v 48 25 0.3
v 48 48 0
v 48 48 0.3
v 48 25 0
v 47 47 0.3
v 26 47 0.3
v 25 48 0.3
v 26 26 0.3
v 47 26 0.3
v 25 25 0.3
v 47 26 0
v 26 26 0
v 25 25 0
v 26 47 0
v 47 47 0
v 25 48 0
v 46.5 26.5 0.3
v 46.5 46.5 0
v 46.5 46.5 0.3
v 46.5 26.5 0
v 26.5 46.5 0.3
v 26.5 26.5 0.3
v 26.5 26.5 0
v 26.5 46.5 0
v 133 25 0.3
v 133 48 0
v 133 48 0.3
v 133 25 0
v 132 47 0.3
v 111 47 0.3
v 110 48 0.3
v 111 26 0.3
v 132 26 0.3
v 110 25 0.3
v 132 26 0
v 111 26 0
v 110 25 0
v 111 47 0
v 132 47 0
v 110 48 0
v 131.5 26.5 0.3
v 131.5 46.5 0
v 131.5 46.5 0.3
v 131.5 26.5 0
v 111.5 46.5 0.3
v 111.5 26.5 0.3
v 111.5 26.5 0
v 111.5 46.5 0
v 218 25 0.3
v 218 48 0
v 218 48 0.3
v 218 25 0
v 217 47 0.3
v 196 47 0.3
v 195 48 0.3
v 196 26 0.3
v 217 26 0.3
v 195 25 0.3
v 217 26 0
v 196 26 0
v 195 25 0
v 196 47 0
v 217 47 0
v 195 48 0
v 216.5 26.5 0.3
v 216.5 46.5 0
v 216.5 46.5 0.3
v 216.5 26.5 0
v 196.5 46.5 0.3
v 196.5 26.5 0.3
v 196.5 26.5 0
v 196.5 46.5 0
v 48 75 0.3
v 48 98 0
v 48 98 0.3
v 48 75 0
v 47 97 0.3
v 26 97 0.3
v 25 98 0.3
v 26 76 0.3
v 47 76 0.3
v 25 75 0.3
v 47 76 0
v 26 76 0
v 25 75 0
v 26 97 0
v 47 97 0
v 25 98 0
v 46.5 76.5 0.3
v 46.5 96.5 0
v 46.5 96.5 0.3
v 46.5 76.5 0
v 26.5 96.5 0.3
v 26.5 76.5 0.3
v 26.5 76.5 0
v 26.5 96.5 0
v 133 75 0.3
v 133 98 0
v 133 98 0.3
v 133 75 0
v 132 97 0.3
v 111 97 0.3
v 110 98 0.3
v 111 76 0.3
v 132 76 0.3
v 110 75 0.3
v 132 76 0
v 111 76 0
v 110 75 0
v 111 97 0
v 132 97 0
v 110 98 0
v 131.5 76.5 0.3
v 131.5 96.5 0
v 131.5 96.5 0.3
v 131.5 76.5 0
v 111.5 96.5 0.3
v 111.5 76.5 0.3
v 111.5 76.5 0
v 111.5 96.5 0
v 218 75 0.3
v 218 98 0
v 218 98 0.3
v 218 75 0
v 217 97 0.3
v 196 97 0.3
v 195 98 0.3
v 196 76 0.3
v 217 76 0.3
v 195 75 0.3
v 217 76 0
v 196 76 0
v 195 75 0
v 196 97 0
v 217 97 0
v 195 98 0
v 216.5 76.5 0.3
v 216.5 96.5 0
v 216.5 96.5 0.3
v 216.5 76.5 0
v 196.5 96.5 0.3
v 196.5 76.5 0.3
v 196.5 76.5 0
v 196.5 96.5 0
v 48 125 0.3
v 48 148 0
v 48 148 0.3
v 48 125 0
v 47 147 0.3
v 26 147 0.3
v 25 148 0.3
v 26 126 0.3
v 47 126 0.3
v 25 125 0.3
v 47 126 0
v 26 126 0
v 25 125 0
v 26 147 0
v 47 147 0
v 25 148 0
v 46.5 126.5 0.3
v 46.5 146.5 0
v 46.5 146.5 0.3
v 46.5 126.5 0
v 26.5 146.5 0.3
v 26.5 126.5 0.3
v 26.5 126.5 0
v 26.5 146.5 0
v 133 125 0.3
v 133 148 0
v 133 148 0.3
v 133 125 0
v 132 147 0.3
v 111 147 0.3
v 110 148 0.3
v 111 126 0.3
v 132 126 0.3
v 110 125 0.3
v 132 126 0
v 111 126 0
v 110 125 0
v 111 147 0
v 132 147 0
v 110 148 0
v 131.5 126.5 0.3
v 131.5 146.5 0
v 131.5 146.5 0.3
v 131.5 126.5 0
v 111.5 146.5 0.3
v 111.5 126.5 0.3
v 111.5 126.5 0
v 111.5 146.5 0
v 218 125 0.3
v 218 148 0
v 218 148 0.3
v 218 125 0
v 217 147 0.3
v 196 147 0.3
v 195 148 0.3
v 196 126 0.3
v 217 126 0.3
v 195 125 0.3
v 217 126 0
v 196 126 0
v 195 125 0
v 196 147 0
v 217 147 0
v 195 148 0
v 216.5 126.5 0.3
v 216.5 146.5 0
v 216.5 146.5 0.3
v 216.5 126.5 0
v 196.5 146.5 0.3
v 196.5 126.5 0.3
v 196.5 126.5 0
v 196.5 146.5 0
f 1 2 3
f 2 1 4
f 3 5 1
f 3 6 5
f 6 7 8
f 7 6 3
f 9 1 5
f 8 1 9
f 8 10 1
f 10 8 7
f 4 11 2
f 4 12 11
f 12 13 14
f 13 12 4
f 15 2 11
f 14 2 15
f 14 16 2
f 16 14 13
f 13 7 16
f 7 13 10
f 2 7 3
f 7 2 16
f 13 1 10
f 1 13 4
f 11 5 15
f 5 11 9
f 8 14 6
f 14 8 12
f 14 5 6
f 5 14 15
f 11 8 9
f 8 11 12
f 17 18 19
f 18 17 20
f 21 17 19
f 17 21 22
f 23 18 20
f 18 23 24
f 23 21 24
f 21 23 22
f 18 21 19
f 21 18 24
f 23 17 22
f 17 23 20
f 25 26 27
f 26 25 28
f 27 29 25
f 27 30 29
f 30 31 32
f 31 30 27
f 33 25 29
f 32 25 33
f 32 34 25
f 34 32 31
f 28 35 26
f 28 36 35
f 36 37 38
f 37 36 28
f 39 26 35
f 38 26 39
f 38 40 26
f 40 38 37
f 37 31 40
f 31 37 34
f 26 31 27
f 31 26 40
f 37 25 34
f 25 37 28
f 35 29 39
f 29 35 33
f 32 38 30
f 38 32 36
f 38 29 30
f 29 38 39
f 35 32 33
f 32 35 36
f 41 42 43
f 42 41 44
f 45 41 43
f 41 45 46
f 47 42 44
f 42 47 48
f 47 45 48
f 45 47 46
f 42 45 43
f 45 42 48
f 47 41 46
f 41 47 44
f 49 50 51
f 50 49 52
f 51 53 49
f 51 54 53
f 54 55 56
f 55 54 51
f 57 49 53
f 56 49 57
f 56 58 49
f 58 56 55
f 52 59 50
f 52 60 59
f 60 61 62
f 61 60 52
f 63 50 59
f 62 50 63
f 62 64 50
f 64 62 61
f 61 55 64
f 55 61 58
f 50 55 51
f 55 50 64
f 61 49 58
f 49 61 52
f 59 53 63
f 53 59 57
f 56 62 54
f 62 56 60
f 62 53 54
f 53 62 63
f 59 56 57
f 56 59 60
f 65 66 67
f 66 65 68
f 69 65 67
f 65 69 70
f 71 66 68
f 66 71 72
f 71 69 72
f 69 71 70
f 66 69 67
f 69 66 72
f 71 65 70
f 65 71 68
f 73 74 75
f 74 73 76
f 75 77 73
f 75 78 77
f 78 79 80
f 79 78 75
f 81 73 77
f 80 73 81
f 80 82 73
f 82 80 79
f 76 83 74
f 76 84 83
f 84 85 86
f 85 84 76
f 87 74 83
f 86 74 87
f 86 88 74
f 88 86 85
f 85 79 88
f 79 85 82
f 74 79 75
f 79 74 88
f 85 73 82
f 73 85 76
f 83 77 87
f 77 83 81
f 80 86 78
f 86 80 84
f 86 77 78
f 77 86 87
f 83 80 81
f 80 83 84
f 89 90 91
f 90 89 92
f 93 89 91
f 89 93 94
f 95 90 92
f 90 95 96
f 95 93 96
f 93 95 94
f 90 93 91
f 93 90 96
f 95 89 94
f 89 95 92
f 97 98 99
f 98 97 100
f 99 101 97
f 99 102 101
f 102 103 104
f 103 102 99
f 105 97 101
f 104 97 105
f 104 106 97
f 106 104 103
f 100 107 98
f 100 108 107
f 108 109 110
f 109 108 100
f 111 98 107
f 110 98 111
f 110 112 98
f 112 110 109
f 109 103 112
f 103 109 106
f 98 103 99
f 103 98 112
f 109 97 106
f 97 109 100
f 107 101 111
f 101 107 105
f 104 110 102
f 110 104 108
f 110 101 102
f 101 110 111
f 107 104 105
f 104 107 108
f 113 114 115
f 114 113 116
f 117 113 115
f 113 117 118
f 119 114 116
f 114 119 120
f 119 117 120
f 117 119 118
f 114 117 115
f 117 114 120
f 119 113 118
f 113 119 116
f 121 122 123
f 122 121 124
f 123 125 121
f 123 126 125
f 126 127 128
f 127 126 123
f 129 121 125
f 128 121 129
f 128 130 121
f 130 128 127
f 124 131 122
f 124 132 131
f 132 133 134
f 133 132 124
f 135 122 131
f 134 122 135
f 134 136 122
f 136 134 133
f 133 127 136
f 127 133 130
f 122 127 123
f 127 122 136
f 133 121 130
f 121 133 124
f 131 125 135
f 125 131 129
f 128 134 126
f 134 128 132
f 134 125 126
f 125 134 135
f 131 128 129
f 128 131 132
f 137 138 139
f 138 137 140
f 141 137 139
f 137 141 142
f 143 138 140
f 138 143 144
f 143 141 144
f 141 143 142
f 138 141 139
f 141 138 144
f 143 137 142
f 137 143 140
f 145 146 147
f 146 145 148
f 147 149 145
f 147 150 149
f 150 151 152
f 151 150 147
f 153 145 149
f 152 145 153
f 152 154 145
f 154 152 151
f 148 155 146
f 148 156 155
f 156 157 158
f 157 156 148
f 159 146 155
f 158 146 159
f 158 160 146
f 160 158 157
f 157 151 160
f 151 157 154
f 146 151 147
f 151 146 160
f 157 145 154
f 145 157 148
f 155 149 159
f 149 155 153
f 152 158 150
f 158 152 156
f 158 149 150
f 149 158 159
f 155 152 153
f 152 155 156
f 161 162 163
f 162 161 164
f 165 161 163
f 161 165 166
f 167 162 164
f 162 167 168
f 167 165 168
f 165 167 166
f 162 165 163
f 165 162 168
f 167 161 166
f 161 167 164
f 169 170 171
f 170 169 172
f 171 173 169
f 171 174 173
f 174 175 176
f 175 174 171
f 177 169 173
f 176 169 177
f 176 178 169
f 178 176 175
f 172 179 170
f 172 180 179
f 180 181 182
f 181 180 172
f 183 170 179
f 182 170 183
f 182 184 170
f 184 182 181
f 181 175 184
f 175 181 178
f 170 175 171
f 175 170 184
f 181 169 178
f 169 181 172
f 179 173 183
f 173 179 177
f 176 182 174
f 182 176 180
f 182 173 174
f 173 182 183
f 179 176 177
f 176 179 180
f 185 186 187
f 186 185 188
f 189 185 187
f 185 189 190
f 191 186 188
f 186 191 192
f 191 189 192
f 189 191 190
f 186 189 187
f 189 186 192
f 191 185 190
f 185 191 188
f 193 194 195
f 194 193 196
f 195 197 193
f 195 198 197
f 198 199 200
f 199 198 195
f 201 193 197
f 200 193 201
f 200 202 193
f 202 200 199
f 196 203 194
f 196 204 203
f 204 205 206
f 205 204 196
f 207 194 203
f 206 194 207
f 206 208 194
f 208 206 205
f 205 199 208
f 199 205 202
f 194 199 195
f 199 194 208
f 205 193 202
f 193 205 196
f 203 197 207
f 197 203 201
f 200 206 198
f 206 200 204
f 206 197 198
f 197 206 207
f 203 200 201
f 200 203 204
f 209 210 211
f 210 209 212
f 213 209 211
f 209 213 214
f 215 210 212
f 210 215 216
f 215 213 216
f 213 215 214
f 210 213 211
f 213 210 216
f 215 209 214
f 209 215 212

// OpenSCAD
/**
 * Print designed to check that you bed is level
 *
 * print four small squares in each corner to ensure even print quality and good adhesion.
 */

// Define your printers printable area
// If you are using Sprinter firmware then these come directly from configuration.h

X_MAX_LENGTH = 240;
Y_MAX_LENGTH = 170;

THICKNESS = 0.3; //Square / outline thickness
SIZE = 20; //Square width / height
GAP = 0.5; //Width of border between square and parameter
OUTLINE_WIDTH = 1; //Width of parameter around square
OFFSET = 25; //Offset from limits in each axis

translate([OFFSET, OFFSET, 0]) square(); //Top Left
translate([(X_MAX_LENGTH / 2) - (SIZE / 2), OFFSET, 0]) square(); //Top Middle
translate([X_MAX_LENGTH - OFFSET - SIZE, OFFSET, 0]) square(); //Top Right

translate([OFFSET, (Y_MAX_LENGTH / 2) - (SIZE / 2), 0]) square(); //Middle Left
translate([(X_MAX_LENGTH / 2) - (SIZE / 2), (Y_MAX_LENGTH / 2) - (SIZE / 2), 0]) square(); //Middle Middle
translate([X_MAX_LENGTH - OFFSET - SIZE, (Y_MAX_LENGTH / 2) - (SIZE / 2), 0]) square(); //Middle Right

translate([OFFSET, Y_MAX_LENGTH - OFFSET - SIZE, 0]) square(); //Bottom Left
translate([(X_MAX_LENGTH / 2) - (SIZE / 2), Y_MAX_LENGTH - OFFSET - SIZE, 0]) square(); //Bottom Middle
translate([X_MAX_LENGTH - OFFSET - SIZE, Y_MAX_LENGTH - OFFSET - SIZE, 0]) square(); //Bottom Right

module square() {
	//Center square
	translate([
				OUTLINE_WIDTH + GAP,
				OUTLINE_WIDTH + GAP,
				0
			])
		cube([SIZE, SIZE, THICKNESS]);

	//Parameter
	difference() {
		//Outer square
		cube([
				SIZE + (2 * (GAP + OUTLINE_WIDTH)),
				SIZE + (2 * (GAP + OUTLINE_WIDTH)),
				THICKNESS
			]);

		//Inner square
		translate([OUTLINE_WIDTH, OUTLINE_WIDTH, -5])
			cube([SIZE + (2 * GAP), SIZE + (2 * GAP), 10]);
	}
}
